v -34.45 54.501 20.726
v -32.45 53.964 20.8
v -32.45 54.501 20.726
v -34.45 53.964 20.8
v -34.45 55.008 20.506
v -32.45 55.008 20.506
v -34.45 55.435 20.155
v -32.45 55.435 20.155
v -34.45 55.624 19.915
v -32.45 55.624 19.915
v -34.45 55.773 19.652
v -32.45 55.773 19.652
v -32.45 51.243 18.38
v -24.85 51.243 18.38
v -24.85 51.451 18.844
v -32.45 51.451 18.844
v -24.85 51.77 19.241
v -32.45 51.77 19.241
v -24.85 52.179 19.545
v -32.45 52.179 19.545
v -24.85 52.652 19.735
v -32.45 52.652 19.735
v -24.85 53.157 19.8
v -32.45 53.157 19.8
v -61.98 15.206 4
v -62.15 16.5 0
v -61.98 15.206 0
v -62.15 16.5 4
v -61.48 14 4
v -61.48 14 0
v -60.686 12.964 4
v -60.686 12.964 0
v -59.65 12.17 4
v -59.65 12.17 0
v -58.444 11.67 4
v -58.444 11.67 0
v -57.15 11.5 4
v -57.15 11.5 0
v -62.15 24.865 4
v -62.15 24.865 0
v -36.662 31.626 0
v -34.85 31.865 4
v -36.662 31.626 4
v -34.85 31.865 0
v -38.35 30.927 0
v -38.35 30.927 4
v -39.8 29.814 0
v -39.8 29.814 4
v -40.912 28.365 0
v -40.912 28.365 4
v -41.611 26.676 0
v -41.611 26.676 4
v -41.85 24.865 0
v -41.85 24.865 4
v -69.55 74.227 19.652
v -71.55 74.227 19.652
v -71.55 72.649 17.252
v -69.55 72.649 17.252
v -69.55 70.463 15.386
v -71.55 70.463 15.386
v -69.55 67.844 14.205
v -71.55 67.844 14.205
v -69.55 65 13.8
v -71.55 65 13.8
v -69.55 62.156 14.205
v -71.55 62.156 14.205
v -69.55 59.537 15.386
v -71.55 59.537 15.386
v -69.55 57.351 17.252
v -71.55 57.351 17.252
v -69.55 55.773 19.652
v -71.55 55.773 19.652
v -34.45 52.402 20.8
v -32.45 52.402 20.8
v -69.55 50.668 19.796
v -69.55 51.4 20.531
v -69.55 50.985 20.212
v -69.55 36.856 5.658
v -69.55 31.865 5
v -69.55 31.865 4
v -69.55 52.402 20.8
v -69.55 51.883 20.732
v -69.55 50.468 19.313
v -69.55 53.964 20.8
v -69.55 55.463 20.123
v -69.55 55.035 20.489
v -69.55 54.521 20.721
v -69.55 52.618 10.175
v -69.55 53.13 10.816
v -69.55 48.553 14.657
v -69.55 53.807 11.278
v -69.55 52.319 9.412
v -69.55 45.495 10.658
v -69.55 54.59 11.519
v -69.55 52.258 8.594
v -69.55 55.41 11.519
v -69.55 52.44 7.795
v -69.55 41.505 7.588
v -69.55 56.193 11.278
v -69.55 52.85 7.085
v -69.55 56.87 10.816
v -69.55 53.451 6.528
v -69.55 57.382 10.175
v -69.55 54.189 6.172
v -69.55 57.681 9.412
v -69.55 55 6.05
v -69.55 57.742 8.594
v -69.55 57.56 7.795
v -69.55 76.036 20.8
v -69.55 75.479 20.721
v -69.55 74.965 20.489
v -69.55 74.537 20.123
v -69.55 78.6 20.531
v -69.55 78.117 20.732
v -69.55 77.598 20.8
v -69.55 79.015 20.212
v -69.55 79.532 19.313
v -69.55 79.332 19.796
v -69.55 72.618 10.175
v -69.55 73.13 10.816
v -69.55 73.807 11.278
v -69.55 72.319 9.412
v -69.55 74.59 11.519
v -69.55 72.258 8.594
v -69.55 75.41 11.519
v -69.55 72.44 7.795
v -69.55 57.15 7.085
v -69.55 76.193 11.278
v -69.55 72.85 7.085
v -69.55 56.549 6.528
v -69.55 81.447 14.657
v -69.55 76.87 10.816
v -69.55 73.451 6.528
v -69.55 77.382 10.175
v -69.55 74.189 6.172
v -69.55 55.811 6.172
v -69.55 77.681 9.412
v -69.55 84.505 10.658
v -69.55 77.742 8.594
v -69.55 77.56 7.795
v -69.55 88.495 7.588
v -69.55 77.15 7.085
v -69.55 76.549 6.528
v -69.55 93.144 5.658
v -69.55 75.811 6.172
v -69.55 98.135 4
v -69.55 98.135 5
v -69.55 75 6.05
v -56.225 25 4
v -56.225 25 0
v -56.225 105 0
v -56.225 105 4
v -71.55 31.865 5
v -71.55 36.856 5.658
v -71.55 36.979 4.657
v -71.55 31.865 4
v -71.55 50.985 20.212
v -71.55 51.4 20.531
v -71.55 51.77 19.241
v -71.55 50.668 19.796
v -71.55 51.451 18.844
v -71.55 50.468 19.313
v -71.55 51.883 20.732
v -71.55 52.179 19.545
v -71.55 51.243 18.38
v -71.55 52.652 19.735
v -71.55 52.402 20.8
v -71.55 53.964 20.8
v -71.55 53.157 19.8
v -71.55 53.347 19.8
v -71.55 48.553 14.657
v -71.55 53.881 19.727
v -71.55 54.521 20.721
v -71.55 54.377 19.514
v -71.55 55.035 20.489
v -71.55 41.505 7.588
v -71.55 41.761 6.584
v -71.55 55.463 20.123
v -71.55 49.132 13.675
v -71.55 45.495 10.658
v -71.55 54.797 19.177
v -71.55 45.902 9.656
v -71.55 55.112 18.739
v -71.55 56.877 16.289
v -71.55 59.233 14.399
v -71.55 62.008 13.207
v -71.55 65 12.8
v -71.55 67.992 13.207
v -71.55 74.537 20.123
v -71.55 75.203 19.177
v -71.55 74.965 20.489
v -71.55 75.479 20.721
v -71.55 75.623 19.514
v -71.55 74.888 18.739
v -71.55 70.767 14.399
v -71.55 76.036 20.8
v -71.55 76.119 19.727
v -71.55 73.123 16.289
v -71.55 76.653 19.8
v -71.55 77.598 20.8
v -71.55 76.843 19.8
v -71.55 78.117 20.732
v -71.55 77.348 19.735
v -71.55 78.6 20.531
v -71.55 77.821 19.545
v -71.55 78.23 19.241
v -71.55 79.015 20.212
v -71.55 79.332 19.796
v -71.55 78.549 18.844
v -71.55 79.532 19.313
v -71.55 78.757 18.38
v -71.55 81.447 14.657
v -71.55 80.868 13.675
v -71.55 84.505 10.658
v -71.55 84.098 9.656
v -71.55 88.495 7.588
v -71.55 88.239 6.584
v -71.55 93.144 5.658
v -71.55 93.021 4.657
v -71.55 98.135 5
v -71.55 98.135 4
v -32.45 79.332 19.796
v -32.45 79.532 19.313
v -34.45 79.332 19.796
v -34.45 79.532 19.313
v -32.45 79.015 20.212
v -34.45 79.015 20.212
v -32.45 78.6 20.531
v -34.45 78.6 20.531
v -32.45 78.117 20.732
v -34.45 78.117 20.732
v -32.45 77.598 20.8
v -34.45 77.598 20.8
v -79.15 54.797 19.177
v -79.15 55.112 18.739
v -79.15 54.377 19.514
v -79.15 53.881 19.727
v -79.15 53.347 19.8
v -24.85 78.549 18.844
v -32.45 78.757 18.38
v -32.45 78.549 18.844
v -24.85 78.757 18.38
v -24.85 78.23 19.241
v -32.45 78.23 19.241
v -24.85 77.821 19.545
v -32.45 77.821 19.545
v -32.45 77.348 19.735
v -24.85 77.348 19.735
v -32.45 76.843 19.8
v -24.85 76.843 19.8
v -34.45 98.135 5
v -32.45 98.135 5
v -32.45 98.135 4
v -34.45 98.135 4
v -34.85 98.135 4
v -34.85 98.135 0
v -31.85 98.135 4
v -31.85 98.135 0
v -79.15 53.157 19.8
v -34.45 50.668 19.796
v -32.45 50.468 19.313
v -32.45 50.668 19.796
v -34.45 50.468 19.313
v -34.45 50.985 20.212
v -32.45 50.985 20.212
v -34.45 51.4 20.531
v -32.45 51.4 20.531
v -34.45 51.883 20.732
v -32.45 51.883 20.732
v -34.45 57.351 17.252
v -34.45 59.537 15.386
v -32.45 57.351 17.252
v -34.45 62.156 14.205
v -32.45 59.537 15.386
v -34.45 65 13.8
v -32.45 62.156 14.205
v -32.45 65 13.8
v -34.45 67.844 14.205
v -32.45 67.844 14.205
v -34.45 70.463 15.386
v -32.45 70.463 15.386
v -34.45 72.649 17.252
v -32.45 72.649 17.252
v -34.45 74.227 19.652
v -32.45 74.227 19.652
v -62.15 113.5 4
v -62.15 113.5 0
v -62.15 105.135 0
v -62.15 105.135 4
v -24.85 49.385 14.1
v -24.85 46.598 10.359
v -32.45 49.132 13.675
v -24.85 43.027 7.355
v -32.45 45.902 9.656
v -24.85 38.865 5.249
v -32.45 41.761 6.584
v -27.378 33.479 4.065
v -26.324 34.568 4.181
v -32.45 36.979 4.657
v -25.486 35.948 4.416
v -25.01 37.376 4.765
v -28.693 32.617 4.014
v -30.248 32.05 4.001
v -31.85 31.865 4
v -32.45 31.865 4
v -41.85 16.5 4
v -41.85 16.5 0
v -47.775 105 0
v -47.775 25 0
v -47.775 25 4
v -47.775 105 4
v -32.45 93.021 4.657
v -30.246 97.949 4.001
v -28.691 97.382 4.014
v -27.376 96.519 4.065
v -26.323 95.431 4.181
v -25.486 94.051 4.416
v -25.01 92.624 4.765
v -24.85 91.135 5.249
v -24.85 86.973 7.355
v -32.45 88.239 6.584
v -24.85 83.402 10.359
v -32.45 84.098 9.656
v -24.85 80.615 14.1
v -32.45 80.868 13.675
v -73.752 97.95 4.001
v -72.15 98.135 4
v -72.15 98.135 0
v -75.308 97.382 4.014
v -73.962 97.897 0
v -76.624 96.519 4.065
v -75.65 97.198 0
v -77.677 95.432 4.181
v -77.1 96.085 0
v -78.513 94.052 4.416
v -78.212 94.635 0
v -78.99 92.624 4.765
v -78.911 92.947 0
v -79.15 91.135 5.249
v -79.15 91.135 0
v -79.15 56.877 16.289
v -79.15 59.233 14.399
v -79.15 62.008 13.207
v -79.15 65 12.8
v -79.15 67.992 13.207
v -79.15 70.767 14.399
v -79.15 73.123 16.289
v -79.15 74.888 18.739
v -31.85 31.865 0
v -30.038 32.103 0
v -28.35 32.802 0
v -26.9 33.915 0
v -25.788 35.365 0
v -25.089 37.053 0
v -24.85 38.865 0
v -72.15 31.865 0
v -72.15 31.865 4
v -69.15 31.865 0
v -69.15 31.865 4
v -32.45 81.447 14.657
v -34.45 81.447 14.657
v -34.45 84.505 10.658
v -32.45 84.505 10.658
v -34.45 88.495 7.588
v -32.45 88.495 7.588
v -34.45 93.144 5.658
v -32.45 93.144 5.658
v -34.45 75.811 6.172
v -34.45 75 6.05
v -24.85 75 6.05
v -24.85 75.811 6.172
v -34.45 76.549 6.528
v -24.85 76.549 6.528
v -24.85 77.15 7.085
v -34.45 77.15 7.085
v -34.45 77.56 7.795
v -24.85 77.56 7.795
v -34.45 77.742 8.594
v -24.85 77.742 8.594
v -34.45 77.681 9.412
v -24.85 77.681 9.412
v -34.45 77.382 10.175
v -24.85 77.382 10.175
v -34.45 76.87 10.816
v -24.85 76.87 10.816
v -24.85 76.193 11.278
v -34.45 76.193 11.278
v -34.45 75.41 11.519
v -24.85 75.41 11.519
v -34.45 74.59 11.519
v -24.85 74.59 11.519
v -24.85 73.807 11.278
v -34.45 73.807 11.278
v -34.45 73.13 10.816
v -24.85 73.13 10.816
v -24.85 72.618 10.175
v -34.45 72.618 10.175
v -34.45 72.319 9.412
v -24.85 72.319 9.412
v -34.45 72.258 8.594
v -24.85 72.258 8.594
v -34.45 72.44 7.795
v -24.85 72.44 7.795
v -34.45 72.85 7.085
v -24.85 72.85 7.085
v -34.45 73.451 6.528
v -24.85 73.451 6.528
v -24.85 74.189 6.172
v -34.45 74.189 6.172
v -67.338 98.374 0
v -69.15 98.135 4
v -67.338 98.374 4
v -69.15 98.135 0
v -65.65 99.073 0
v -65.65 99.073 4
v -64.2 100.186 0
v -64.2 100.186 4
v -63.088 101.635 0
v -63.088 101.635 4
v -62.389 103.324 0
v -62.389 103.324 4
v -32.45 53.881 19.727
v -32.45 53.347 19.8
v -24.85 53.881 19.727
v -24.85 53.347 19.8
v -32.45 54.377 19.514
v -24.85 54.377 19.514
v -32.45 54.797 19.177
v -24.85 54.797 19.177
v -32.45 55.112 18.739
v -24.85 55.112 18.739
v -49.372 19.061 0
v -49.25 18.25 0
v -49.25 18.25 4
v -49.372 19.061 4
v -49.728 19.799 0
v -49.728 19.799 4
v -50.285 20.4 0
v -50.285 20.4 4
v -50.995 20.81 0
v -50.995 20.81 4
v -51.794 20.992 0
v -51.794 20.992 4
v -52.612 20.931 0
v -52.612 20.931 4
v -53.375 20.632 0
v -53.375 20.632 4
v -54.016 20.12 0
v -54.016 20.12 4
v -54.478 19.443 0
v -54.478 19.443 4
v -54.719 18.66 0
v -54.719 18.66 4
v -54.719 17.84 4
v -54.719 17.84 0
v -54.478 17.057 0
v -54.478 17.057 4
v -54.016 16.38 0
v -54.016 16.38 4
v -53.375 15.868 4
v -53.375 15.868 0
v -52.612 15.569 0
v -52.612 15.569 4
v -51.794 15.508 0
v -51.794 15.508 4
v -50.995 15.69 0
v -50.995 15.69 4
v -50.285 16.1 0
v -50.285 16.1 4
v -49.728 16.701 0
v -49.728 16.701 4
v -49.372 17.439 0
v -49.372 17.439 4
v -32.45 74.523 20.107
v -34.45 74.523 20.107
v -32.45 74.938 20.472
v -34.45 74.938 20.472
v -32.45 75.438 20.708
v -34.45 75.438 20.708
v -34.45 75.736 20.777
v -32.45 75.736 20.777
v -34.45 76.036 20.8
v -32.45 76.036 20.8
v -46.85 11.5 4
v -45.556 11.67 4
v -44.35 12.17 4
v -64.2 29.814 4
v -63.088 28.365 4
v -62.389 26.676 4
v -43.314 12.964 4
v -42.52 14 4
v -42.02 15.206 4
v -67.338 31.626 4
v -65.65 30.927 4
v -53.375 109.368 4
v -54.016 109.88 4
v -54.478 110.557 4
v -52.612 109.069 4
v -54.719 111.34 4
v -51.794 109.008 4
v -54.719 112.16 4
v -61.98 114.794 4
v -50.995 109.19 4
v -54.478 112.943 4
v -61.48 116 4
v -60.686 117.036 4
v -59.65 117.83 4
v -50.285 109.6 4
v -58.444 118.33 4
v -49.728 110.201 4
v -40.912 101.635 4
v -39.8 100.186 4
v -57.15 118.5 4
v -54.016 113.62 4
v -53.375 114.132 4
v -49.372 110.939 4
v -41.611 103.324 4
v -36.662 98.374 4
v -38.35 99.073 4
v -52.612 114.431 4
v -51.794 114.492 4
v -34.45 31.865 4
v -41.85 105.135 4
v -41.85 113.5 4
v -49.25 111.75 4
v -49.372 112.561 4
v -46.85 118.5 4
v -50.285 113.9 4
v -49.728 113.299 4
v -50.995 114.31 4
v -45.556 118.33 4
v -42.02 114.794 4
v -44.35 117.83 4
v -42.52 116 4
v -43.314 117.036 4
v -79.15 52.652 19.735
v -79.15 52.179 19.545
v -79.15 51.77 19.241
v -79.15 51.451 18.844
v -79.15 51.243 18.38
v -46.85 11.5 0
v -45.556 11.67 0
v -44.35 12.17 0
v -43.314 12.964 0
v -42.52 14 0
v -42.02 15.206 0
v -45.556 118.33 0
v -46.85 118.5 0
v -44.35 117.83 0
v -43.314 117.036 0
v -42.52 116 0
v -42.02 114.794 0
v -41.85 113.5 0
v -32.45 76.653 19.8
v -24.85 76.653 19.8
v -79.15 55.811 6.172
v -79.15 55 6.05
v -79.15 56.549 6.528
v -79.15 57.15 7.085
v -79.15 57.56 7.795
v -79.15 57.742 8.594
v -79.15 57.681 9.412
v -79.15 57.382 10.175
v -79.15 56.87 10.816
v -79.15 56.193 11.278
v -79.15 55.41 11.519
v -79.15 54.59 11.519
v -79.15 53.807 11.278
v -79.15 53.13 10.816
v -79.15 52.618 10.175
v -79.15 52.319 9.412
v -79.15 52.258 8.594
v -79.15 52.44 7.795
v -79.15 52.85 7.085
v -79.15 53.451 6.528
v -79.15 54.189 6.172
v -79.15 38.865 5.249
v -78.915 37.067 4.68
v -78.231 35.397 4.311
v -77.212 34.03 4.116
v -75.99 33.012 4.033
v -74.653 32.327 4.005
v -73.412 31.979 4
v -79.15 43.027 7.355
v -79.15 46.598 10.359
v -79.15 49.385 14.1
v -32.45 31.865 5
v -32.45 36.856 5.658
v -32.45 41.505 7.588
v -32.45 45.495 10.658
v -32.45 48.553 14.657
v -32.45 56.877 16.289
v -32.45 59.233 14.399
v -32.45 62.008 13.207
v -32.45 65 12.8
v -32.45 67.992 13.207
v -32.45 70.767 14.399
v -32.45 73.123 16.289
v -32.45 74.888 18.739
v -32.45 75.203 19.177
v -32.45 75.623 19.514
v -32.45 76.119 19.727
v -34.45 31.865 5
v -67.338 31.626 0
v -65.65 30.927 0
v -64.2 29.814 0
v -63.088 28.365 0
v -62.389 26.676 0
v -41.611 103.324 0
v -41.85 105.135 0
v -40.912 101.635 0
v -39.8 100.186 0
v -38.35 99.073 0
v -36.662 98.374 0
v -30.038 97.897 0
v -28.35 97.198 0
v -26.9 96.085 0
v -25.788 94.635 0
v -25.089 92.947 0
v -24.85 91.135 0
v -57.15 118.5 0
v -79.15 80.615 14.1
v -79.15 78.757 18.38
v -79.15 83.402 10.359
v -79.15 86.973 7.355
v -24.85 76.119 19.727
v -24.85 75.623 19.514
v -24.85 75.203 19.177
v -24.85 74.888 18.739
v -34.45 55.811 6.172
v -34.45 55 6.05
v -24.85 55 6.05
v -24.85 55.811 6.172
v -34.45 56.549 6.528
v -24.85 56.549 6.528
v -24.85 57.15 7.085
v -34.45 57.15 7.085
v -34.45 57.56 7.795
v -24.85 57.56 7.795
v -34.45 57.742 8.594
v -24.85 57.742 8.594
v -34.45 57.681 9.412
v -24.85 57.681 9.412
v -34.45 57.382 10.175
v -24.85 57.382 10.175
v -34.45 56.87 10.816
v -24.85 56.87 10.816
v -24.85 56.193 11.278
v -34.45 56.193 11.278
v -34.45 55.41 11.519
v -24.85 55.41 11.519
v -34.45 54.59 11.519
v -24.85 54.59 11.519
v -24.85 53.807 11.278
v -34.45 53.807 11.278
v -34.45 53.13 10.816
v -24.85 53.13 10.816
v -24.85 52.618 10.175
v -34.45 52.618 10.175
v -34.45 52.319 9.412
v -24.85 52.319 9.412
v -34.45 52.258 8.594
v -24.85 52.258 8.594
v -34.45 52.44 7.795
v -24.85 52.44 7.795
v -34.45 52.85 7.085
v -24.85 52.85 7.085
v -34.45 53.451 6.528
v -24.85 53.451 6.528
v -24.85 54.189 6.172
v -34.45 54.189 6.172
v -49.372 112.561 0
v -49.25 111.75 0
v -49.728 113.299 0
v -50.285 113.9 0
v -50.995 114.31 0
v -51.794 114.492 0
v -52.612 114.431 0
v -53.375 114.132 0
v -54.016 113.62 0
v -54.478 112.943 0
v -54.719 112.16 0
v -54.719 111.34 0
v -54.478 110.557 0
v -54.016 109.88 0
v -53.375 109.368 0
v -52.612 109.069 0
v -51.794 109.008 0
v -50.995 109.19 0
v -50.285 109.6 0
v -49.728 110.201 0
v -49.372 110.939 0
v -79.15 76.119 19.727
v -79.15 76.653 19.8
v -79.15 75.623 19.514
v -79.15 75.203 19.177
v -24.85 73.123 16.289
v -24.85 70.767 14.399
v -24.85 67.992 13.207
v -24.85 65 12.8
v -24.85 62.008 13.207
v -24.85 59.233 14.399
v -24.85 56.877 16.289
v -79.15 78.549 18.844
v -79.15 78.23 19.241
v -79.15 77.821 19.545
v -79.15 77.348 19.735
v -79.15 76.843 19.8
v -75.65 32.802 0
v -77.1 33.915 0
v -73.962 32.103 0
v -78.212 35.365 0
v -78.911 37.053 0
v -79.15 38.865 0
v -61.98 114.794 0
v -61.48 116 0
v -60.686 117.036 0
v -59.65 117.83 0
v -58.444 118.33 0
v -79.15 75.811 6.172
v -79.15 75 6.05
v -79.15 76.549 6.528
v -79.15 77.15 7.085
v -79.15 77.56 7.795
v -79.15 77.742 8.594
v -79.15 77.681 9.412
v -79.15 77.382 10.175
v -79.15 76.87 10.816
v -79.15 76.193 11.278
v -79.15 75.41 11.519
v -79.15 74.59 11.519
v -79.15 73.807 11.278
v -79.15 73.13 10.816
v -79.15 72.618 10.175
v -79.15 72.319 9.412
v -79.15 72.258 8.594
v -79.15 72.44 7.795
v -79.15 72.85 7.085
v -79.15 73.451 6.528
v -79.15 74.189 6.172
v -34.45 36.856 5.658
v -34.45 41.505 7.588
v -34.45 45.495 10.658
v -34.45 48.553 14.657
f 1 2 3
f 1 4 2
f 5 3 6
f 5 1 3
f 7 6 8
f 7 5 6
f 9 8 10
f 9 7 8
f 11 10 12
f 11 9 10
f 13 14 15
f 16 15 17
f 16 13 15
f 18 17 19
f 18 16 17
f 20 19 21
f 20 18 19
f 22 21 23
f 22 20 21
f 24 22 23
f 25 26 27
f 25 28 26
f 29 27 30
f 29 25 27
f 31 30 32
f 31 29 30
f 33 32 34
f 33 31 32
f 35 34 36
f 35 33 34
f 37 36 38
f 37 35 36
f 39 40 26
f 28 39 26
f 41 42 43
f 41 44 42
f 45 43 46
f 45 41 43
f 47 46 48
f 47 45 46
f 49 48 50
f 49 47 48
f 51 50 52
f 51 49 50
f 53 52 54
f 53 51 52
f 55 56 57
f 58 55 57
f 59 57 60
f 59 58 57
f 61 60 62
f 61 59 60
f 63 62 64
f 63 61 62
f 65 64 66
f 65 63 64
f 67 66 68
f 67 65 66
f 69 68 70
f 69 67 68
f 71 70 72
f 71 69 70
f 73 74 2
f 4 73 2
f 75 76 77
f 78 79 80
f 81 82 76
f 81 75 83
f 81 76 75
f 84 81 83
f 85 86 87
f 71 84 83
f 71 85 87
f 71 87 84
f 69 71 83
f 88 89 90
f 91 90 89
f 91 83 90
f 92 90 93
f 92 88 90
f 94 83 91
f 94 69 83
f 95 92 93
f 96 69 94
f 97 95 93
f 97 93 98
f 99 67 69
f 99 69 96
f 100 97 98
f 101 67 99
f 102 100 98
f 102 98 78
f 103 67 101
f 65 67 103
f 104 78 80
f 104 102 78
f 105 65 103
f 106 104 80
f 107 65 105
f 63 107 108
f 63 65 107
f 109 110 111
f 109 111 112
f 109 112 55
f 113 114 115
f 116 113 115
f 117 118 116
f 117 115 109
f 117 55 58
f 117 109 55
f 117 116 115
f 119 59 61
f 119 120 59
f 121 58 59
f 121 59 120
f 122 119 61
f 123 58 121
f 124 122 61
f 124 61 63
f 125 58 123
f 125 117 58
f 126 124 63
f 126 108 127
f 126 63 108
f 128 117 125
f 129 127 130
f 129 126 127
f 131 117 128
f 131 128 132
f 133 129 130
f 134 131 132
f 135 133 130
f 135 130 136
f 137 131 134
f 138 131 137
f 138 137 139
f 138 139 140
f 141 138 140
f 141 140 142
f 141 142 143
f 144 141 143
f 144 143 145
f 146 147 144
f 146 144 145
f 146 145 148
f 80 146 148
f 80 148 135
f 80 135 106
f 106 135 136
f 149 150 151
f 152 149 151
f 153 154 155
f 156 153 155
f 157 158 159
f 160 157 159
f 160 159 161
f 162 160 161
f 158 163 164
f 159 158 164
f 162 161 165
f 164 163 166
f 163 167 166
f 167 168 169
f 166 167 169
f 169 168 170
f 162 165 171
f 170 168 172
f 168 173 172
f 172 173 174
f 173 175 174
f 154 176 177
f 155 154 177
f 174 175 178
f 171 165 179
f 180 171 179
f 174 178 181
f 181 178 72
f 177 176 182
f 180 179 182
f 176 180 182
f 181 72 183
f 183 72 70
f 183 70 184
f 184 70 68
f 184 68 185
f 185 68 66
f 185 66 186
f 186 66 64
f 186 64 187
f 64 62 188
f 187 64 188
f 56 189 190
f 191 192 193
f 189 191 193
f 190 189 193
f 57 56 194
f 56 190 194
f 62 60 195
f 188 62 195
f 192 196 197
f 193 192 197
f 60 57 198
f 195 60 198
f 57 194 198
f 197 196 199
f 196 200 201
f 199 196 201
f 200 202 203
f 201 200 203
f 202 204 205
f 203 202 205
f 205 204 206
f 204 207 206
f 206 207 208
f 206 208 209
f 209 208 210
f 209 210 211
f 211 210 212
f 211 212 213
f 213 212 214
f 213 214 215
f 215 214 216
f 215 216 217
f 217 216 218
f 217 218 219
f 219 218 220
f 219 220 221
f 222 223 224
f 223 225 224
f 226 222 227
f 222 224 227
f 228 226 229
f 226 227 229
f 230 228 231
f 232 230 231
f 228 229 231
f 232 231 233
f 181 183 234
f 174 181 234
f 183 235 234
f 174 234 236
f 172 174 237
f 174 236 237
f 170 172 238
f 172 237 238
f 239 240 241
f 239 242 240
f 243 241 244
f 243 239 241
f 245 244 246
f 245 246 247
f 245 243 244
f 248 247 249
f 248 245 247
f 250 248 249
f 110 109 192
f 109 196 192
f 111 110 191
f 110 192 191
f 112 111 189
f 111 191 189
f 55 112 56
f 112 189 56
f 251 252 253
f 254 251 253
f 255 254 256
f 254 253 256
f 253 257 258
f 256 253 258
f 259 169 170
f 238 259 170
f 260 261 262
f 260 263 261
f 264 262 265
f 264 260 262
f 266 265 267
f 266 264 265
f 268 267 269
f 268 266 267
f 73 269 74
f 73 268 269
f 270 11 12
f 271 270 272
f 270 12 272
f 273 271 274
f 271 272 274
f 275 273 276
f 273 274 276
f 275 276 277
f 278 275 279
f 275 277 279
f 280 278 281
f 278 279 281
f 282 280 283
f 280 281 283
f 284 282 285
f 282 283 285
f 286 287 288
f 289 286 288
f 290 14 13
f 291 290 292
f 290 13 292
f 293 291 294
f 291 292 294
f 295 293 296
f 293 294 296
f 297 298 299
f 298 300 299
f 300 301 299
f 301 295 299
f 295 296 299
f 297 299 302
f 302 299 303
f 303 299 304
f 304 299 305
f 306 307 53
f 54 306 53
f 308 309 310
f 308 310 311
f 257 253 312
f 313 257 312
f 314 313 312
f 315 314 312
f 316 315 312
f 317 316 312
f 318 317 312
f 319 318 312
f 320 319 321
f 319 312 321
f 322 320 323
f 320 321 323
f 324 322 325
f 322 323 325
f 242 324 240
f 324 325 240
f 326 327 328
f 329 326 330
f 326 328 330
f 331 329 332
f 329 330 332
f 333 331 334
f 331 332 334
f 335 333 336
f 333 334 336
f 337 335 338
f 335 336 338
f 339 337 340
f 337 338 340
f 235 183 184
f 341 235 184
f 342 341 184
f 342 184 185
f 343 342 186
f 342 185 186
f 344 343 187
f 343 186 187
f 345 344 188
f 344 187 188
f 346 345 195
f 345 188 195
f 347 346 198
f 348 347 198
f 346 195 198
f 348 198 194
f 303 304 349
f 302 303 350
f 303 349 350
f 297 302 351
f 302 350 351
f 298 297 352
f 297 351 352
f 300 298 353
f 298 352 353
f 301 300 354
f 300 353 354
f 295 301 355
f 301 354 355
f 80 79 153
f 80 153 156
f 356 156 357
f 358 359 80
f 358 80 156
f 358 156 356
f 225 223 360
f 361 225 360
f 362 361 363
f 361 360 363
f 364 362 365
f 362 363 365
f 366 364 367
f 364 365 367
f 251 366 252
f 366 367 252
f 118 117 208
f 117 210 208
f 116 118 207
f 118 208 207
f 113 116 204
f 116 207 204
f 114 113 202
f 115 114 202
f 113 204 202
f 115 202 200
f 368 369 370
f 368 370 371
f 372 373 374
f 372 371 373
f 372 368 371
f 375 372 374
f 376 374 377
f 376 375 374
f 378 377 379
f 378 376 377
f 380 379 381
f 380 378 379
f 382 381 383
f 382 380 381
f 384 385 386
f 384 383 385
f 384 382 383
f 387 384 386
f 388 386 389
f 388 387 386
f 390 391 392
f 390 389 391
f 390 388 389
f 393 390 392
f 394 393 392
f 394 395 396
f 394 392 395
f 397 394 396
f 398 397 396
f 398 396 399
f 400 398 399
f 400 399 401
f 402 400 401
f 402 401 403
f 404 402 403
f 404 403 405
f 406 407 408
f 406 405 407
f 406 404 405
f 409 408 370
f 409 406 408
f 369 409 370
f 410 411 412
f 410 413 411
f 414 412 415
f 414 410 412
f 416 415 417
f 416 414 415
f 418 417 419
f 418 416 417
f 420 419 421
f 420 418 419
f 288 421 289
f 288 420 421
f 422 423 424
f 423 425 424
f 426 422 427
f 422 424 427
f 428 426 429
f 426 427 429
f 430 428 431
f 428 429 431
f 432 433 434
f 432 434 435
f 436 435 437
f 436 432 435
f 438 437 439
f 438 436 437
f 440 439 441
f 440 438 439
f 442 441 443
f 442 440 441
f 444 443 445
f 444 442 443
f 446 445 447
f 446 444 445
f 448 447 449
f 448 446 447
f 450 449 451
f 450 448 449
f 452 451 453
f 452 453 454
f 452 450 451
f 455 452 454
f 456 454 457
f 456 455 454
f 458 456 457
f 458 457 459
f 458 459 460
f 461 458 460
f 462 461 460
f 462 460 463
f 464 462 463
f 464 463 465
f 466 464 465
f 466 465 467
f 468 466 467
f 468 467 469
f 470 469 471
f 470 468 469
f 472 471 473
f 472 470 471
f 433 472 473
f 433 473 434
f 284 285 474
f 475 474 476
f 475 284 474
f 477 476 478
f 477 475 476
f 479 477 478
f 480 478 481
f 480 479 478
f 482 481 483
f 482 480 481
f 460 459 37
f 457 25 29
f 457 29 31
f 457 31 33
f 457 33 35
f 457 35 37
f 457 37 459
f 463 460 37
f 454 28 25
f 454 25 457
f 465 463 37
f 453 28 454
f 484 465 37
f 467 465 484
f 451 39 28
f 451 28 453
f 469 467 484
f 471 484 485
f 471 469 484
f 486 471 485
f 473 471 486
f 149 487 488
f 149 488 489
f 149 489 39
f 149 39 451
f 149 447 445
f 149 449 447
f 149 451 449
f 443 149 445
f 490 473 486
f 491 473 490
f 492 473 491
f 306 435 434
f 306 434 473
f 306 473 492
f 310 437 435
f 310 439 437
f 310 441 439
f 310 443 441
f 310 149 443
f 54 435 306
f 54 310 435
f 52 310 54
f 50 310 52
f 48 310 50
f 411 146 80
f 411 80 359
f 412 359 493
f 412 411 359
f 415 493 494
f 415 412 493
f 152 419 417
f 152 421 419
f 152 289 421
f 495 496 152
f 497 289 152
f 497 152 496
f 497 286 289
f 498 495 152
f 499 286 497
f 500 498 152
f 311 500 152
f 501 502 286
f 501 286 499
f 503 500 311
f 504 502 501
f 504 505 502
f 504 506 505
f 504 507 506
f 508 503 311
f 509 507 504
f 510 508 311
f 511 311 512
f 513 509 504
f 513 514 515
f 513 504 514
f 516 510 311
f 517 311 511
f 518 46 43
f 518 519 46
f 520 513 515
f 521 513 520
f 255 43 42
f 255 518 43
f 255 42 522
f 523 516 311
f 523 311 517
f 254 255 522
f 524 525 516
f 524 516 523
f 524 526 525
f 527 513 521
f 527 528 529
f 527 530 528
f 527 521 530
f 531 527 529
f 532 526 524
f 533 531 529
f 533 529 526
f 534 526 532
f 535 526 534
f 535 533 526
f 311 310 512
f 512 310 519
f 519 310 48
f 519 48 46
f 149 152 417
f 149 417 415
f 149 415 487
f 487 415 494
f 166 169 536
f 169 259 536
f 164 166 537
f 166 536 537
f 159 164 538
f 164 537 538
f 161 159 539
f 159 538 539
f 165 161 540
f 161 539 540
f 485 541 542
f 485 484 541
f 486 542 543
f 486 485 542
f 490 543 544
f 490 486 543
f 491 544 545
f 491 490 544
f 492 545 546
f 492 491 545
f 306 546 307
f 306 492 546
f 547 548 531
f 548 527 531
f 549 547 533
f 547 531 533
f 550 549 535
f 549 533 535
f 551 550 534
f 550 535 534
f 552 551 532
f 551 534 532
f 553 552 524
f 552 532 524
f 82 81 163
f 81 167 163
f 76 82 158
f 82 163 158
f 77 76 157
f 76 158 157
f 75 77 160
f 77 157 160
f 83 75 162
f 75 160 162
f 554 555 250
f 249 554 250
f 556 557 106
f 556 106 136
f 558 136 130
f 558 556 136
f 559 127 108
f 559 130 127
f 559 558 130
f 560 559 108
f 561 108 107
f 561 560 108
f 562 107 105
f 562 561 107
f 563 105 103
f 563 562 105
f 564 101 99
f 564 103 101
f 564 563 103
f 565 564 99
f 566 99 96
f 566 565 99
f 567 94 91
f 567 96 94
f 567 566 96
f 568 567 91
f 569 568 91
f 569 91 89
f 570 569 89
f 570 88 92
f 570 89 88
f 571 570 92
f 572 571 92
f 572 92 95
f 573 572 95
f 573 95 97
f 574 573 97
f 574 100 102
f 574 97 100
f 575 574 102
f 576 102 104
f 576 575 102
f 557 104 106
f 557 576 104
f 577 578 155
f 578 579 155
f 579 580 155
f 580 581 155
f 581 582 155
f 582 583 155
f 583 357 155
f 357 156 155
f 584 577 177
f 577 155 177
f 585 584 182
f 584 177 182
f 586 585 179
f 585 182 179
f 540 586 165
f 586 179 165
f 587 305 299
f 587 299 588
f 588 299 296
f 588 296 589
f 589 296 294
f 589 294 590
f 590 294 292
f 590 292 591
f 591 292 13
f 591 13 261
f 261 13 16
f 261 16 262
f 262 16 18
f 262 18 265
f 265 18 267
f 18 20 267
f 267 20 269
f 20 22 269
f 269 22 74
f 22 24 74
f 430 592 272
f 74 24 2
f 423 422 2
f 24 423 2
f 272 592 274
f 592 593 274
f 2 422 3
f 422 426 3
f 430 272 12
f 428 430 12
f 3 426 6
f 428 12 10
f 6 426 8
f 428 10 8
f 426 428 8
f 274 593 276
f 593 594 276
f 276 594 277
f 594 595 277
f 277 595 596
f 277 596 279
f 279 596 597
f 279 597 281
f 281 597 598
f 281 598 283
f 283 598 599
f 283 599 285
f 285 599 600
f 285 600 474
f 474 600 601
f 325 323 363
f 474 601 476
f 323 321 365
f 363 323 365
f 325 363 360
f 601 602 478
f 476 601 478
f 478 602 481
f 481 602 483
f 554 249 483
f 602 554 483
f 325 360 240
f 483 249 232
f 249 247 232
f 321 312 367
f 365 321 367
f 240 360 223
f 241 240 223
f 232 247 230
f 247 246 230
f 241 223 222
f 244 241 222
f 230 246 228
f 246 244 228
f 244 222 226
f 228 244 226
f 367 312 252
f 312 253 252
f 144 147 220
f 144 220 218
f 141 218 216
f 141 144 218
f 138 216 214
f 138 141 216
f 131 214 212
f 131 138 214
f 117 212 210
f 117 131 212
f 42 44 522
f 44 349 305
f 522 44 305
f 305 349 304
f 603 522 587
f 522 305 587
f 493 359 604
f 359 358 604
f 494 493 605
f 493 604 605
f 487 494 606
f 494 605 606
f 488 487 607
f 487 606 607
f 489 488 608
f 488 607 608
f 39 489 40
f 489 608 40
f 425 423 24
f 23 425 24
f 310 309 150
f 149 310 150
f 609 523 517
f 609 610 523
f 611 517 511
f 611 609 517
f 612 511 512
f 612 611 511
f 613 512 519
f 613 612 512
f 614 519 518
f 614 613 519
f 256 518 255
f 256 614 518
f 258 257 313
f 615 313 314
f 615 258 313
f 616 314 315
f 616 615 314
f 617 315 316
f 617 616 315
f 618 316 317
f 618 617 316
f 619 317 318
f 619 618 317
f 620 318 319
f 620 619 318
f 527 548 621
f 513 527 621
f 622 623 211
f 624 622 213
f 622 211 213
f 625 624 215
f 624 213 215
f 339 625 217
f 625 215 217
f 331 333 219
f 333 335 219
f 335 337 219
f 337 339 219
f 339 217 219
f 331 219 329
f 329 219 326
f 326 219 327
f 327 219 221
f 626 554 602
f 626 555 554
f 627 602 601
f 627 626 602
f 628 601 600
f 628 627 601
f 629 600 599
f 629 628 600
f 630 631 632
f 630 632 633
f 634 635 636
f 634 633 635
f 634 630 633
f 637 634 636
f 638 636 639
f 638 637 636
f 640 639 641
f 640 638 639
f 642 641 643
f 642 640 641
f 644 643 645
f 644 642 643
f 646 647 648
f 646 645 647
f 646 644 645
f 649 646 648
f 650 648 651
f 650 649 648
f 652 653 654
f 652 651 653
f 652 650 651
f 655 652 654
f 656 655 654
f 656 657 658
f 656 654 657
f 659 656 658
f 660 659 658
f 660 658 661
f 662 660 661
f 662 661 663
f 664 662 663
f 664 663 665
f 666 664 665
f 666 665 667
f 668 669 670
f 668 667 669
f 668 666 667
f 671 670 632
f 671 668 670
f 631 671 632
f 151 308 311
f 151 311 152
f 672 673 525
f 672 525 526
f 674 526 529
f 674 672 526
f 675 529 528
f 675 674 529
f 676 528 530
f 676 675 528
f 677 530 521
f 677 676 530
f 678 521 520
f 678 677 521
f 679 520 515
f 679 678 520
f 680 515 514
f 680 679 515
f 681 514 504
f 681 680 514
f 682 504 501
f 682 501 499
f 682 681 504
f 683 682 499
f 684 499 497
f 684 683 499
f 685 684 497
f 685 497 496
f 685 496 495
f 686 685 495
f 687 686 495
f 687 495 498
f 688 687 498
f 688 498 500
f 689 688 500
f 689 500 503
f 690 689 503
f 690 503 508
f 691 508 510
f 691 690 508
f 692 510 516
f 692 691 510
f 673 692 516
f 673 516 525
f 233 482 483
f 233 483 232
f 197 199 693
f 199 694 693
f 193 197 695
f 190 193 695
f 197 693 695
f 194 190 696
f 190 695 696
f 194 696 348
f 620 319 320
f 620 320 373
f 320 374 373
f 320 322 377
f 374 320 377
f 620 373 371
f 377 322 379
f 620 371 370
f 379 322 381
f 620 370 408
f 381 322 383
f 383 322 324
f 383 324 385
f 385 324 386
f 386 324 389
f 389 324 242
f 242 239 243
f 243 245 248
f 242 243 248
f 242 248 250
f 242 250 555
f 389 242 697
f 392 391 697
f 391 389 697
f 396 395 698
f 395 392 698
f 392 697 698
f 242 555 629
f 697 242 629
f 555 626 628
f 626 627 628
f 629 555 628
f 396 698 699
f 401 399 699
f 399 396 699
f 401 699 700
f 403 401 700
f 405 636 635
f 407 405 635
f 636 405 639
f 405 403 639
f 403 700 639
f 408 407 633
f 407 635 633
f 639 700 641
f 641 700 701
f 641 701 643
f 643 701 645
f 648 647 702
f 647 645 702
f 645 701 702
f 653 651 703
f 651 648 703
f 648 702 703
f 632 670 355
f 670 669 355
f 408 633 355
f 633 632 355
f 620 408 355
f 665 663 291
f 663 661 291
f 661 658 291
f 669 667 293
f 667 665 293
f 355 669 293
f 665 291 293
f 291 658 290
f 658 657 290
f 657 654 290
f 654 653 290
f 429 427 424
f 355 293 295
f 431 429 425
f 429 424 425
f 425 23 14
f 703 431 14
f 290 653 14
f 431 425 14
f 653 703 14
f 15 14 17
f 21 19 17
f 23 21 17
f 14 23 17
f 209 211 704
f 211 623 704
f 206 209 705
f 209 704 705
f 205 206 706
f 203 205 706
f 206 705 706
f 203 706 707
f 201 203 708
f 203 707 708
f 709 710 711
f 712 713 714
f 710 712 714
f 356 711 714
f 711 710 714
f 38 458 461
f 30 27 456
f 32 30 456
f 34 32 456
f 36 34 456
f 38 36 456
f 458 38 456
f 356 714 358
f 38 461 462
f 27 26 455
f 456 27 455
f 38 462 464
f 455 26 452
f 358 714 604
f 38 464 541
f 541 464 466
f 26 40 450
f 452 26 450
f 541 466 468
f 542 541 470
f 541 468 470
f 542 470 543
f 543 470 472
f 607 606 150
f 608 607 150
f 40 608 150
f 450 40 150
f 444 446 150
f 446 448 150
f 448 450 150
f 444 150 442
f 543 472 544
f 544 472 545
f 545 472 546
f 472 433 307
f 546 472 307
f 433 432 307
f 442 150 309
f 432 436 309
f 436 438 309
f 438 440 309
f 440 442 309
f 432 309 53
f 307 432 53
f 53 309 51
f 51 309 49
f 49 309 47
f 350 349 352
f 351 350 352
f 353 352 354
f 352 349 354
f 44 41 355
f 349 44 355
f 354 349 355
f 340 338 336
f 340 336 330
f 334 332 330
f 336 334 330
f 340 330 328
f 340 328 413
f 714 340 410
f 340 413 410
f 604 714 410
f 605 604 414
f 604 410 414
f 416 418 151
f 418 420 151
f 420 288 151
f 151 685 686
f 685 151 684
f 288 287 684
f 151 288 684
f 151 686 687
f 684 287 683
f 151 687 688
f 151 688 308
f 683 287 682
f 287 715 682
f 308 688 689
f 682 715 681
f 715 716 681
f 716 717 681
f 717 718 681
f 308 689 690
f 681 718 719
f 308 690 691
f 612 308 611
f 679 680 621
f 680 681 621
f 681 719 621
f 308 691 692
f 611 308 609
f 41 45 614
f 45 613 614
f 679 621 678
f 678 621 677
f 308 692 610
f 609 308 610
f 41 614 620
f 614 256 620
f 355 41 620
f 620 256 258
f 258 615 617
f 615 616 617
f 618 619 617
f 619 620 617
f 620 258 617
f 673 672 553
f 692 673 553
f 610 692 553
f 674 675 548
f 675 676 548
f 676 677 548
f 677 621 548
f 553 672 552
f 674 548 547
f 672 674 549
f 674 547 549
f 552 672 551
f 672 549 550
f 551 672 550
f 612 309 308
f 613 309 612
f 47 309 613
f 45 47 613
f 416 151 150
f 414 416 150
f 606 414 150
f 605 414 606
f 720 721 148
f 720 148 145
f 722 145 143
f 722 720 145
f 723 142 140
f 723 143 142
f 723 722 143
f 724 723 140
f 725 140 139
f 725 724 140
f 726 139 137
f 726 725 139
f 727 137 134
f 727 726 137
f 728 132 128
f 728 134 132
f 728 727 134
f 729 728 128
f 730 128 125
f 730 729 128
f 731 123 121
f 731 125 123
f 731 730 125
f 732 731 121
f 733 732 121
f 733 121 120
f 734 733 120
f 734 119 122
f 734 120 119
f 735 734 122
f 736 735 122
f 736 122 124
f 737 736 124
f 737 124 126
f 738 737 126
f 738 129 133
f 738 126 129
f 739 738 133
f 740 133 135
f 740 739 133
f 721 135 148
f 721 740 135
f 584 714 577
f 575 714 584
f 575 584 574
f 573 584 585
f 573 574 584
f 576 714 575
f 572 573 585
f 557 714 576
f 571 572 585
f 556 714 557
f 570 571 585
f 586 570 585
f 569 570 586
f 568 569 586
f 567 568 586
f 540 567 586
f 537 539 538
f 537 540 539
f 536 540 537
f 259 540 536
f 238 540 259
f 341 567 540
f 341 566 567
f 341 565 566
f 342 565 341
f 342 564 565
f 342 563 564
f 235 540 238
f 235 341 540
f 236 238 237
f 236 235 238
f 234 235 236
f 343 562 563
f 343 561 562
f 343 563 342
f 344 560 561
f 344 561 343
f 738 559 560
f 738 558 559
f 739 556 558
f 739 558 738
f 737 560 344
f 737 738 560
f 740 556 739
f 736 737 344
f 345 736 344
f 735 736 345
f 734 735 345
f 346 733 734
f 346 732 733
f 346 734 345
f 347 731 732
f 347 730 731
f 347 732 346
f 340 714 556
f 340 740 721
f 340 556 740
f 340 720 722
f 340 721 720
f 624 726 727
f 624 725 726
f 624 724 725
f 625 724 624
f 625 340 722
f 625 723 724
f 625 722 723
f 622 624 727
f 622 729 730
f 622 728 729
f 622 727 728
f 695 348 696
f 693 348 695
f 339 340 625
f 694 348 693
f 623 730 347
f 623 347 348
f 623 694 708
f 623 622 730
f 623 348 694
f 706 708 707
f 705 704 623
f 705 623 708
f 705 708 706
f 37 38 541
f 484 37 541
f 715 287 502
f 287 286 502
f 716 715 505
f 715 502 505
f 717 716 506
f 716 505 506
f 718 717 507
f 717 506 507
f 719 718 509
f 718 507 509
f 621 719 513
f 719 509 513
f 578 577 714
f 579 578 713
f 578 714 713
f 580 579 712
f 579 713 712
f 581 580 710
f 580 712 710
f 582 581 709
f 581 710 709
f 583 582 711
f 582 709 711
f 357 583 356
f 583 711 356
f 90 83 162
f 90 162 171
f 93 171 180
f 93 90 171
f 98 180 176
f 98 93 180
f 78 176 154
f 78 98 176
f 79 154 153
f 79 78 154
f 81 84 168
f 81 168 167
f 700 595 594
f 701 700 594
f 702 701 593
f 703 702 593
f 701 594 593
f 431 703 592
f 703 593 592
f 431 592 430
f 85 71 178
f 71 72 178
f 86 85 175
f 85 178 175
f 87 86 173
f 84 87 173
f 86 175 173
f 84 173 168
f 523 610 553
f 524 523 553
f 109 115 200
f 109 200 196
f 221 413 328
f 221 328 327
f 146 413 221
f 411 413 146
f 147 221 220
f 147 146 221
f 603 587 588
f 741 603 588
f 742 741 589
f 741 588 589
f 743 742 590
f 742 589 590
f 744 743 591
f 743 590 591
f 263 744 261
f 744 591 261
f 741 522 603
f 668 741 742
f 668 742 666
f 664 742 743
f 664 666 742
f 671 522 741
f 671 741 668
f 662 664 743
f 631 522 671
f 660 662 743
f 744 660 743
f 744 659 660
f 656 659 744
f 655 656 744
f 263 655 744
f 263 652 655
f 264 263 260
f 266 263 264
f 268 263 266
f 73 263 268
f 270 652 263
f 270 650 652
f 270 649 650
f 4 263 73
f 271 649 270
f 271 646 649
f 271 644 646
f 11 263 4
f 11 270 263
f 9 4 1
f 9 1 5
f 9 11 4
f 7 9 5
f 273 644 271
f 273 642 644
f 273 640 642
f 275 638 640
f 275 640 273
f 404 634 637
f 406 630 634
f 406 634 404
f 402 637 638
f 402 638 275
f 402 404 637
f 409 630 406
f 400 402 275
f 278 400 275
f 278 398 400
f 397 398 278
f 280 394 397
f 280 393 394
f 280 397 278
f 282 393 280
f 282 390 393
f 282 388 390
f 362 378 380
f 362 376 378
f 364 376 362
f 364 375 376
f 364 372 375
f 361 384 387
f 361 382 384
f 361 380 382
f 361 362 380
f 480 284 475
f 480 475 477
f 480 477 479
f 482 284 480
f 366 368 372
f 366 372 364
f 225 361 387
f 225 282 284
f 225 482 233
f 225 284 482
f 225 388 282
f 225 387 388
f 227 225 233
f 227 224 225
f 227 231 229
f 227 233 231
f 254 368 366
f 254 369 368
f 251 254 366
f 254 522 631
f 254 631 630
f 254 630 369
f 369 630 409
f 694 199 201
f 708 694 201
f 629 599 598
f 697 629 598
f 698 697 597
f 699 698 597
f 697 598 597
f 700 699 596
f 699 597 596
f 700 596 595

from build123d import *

# Parameters (mm, degrees)
SKETCH1_R               = 2.75
BOSS_EXTRUDE1_DEPTH     = 4
FILLET1_R               = 5
BOSS_EXTRUDE3_DEPTH     = 9.6
BOSS_EXTRUDE4_DEPTH     = 10
BOSS_EXTRUDE5_DEPTH     = 4
BOSS_EXTRUDE6_START     = -12
BOSS_EXTRUDE6_DEPTH     = 12
CUT_EXTRUDE1_START      = -10
CUT_EXTRUDE1_DEPTH      = 10
BOSS_EXTRUDE7_DEPTH     = 4
BOSS_EXTRUDE8_START     = -7.6
BOSS_EXTRUDE8_DEPTH     = 7.6
BOSS_EXTRUDE9_START     = 2
BOSS_EXTRUDE9_DEPTH     = 2
FILLET2_R               = 7
SKETCH15_W              = 8.45
SKETCH15_H              = 80
CUT_EXTRUDE2_DEPTH      = 14
FILLET3_R               = 2
CUT_EXTRUDE4_DEPTH      = 132.997651535
CUT_EXTRUDE4_DEPTH_BACK = 132.997651535
SKETCH17_R              = 2.75


with BuildPart() as part:
    # Sketch1 → Boss-Extrude1 (new body)
    with BuildSketch(Plane.XY):
        Polygon((-62.15, 75), (-69.55, 75), (-69.55, 65.75), (-62.15, 65.75), (-62.15, 64.25), (-69.55, 64.25), (-69.55, 55), (-62.15, 55), (-62.15, 11.5), (-41.85, 11.5), (-41.85, 55), (-34.45, 55), (-34.45, 64.25), (-41.85, 64.25), (-41.85, 65.75), (-34.45, 65.75), (-34.45, 75), (-41.85, 75), (-41.85, 118.5), (-62.15, 118.5), align=None)
        with Locations((-52, 111.75)):
            Circle(SKETCH1_R, mode=Mode.SUBTRACT)
        with Locations((-52, 18.25)):
            Circle(SKETCH1_R, mode=Mode.SUBTRACT)
    extrude(amount=BOSS_EXTRUDE1_DEPTH)

    # Fillet1
    fillet1_edges = [part.edges().sort_by_distance(p)[0] for p in [
        (-62.15, 118.5, 2),
        (-41.85, 118.5, 2),
        (-41.85, 11.5, 2),
        (-62.15, 11.5, 2),
    ]]
    fillet(fillet1_edges, radius=FILLET1_R)



with BuildPart() as body_2:
    # Sketch3 → Boss-Extrude3 (new body)
    with BuildSketch(Plane(origin=(-34.45, 0, 0), x_dir=(0, 0, -1), z_dir=(1, 0, 0))):
        with BuildLine():
            Line((-12.8, 65), (-4, 65))
            Line((-4, 65), (-4, 65.75))
            Line((-4, 65.75), (-4, 75))
            Line((-4, 75), (-4, 98.135455405))
            ThreePointArc((-4, 98.135455405), (-8.435930345, 85.488200598), (-19.8, 78.382677882))
            Line((-19.8, 78.382677882), (-19.8, 75.382677882))
            ThreePointArc((-19.8, 75.382677882), (-14.713450587, 71.260990337), (-12.8, 65))
        make_face()
        with BuildLine():
            Line((-4, 31.864544449), (-4, 65))
            Line((-4, 65), (-12.8, 65))
            ThreePointArc((-12.8, 65), (-14.713450587, 58.739009663), (-19.8, 54.617322118))
            Line((-19.8, 54.617322118), (-19.8, 51.617322118))
            ThreePointArc((-19.8, 51.617322118), (-8.435930299, 44.511799345), (-4, 31.864544449))
        make_face()
    extrude(amount=BOSS_EXTRUDE3_DEPTH)


with BuildPart() as part_1:
    add(part.part)

    add(body_2.part)  # Boss-Extrude4 merges body 2
    # Sketch5 → Boss-Extrude4 (add)
    with BuildSketch(Plane.ZY.offset(34.45)):
        with BuildLine():
            Line((4, 98.135455551), (4, 31.864544449))
            ThreePointArc((4, 31.864544449), (8.435930299, 44.511799345), (19.8, 51.617322118))
            Line((19.8, 51.617322118), (19.8, 54.617322118))
            ThreePointArc((19.8, 54.617322118), (12.8, 65), (19.8, 75.382677882))
            Line((19.8, 75.382677882), (19.8, 78.382677882))
            ThreePointArc((19.8, 78.382677882), (8.435930299, 85.488200655), (4, 98.135455551))
        make_face()
    extrude(amount=BOSS_EXTRUDE4_DEPTH)

    # Sketch6 → Boss-Extrude5 (add)
    with BuildSketch(Plane(origin=(0, 0, 4), x_dir=(-1, 0, 0), z_dir=(0, 0, -1))):
        Polygon((24.85, 31.864544449), (41.85, 31.864544449), (41.85, 55), (34.45, 55), (34.45, 64.25), (41.85, 64.25), (41.85, 65.75), (34.45, 65.75), (34.45, 75), (41.85, 75), (41.85, 98.135455551), (24.85, 98.135455551), align=None)
    extrude(amount=BOSS_EXTRUDE5_DEPTH)

    # Sketch9 → Boss-Extrude6 (add)
    with BuildSketch(Plane.ZY.offset(44.45).offset(BOSS_EXTRUDE6_START)):
        with BuildLine():
            Line((4, 31.864544449), (5, 31.864544449))
            ThreePointArc((5, 31.864544449), (9.468774813, 44.195523989), (20.8, 50.800547872))
            Line((20.8, 50.800547872), (20.8, 55.31495999))
            ThreePointArc((20.8, 55.31495999), (20.485627959, 55.424552796), (20.175, 55.544346929))
            ThreePointArc((20.175, 55.544346929), (13.8, 65), (20.175, 74.455653071))
            ThreePointArc((20.175, 74.455653071), (20.485627959, 74.575447204), (20.8, 74.68504001))
            Line((20.8, 74.68504001), (20.8, 79.199452128))
            ThreePointArc((20.8, 79.199452128), (9.468774813, 85.804476011), (5, 98.135455551))
            Line((5, 98.135455551), (4, 98.135455551))
            ThreePointArc((4, 98.135455551), (8.435930299, 85.488200655), (19.8, 78.382677882))
            Line((19.8, 78.382677882), (19.8, 75.382677882))
            ThreePointArc((19.8, 75.382677882), (12.8, 65), (19.8, 54.617322118))
            Line((19.8, 54.617322118), (19.8, 51.617322118))
            ThreePointArc((19.8, 51.617322118), (8.435930299, 44.511799345), (4, 31.864544449))
        make_face()
    extrude(amount=BOSS_EXTRUDE6_DEPTH)

    # Sketch10 → Cut-Extrude1 (cut)
    with BuildSketch(Plane.ZY.offset(44.45).offset(CUT_EXTRUDE1_START)):
        with BuildLine():
            Line((4, 98.135455551), (4, 31.864544449))
            Line((4, 31.864544449), (5, 31.864544449))
            ThreePointArc((5, 31.864544449), (9.468774813, 44.195523989), (20.8, 50.800547872))
            Line((20.8, 50.800547872), (20.8, 55.31495999))
            ThreePointArc((20.8, 55.31495999), (13.8, 65), (20.8, 74.68504001))
            Line((20.8, 74.68504001), (20.8, 79.199452128))
            ThreePointArc((20.8, 79.199452128), (9.468774813, 85.804476011), (5, 98.135455551))
            Line((5, 98.135455551), (4, 98.135455551))
        make_face()
    extrude(amount=CUT_EXTRUDE1_DEPTH, mode=Mode.SUBTRACT)

    # Sketch12 → Boss-Extrude7 (add)
    with BuildSketch(Plane.XY.offset(4)):
        Polygon((-79.15, 31.864544449), (-62.15, 31.864544449), (-62.15, 55), (-69.55, 55), (-69.55, 64.25), (-62.15, 64.25), (-62.15, 65.75), (-69.55, 65.75), (-69.55, 75), (-62.15, 75), (-62.15, 98.135455551), (-79.15, 98.135455551), align=None)
    extrude(amount=-BOSS_EXTRUDE7_DEPTH)

    # Sketch13 → Boss-Extrude8 (add)
    with BuildSketch(Plane.ZY.offset(79.15).offset(BOSS_EXTRUDE8_START)):
        with BuildLine():
            Line((19.8, 75.382677882), (19.8, 78.382677882))
            ThreePointArc((19.8, 78.382677882), (8.435930299, 85.488200655), (4, 98.135455551))
            Line((4, 98.135455551), (0, 98.135455551))
            Line((0, 98.135455551), (0, 31.864544449))
            Line((0, 31.864544449), (4, 31.864544449))
            ThreePointArc((4, 31.864544449), (8.435930299, 44.511799345), (19.8, 51.617322118))
            Line((19.8, 51.617322118), (19.8, 54.617322118))
            ThreePointArc((19.8, 54.617322118), (12.8, 65), (19.8, 75.382677882))
        make_face()
    extrude(amount=BOSS_EXTRUDE8_DEPTH)

    # Sketch14 → Boss-Extrude9 (add)
    with BuildSketch(Plane(origin=(-71.55, 0, 0), x_dir=(0, 0, -1), z_dir=(1, 0, 0)).offset(BOSS_EXTRUDE9_START)):
        with BuildLine():
            Line((-4, 98.135455551), (-5, 98.135455551))
            ThreePointArc((-5, 98.135455551), (-9.468774813, 85.804476011), (-20.8, 79.199452128))
            Line((-20.8, 79.199452128), (-20.8, 74.68504001))
            ThreePointArc((-20.8, 74.68504001), (-13.8, 65), (-20.8, 55.31495999))
            Line((-20.8, 55.31495999), (-20.8, 50.800547872))
            ThreePointArc((-20.8, 50.800547872), (-9.468774813, 44.195523989), (-5, 31.864544449))
            Line((-5, 31.864544449), (-4, 31.864544449))
            Line((-4, 31.864544449), (-4, 98.135455551))
        make_face()
    extrude(amount=-BOSS_EXTRUDE9_DEPTH)

    # Fillet2
    fillet2_edges = [part_1.edges().sort_by_distance(p)[0] for p in [
        (-24.85, 98.135455551, 2),
        (-24.85, 31.864544449, 2),
        (-41.85, 31.864544449, 2),
        (-41.85, 98.135455551, 2),
        (-79.15, 31.864544449, 2),
        (-79.15, 98.135455551, 2),
        (-62.15, 98.135455551, 2),
        (-62.15, 31.864544449, 2),
    ]]
    fillet(fillet2_edges, radius=FILLET2_R)

    # Sketch15 → Cut-Extrude2 (cut)
    with BuildSketch(Plane(origin=(0, 0, 0), x_dir=(-1, 0, 0), z_dir=(0, 0, -1))):
        with Locations((52, 65)):
            Rectangle(SKETCH15_W, SKETCH15_H)
    extrude(amount=-CUT_EXTRUDE2_DEPTH, mode=Mode.SUBTRACT)

    # Fillet3
    fillet3_edges = [part_1.edges().sort_by_distance(p)[0] for p in [
        (-28.65, 75.382677882, 19.8),
        (-28.65, 78.382677882, 19.8),
        (-28.65, 54.617322118, 19.8),
        (-28.65, 51.617322118, 19.8),
        (-33.45, 50.800547872, 20.8),
        (-33.45, 79.199452128, 20.8),
        (-33.45, 74.68504001, 20.8),
        (-33.45, 55.31495999, 20.8),
        (-75.35, 78.382677882, 19.8),
        (-75.35, 75.382677882, 19.8),
        (-75.35, 54.617322118, 19.8),
        (-75.35, 51.617322118, 19.8),
        (-70.55, 79.199452128, 20.8),
        (-70.55, 74.68504001, 20.8),
        (-70.55, 55.31495999, 20.8),
        (-70.55, 50.800547872, 20.8),
    ]]
    fillet(fillet3_edges, radius=FILLET3_R)

    # Sketch17 → Cut-Extrude4 (cut, two sides: drawn at the far end of the back side and taken through both)
    with BuildSketch(Plane(origin=(-24.85, 0, 0), x_dir=(0, 0, -1), z_dir=(1, 0, 0)).offset(-CUT_EXTRUDE4_DEPTH_BACK)):
        with Locations((-8.8, 75)):
            Circle(SKETCH17_R)
        with Locations((-8.8, 55)):
            Circle(SKETCH17_R)
    extrude(amount=CUT_EXTRUDE4_DEPTH + CUT_EXTRUDE4_DEPTH_BACK, mode=Mode.SUBTRACT)


solid = part_1.part
